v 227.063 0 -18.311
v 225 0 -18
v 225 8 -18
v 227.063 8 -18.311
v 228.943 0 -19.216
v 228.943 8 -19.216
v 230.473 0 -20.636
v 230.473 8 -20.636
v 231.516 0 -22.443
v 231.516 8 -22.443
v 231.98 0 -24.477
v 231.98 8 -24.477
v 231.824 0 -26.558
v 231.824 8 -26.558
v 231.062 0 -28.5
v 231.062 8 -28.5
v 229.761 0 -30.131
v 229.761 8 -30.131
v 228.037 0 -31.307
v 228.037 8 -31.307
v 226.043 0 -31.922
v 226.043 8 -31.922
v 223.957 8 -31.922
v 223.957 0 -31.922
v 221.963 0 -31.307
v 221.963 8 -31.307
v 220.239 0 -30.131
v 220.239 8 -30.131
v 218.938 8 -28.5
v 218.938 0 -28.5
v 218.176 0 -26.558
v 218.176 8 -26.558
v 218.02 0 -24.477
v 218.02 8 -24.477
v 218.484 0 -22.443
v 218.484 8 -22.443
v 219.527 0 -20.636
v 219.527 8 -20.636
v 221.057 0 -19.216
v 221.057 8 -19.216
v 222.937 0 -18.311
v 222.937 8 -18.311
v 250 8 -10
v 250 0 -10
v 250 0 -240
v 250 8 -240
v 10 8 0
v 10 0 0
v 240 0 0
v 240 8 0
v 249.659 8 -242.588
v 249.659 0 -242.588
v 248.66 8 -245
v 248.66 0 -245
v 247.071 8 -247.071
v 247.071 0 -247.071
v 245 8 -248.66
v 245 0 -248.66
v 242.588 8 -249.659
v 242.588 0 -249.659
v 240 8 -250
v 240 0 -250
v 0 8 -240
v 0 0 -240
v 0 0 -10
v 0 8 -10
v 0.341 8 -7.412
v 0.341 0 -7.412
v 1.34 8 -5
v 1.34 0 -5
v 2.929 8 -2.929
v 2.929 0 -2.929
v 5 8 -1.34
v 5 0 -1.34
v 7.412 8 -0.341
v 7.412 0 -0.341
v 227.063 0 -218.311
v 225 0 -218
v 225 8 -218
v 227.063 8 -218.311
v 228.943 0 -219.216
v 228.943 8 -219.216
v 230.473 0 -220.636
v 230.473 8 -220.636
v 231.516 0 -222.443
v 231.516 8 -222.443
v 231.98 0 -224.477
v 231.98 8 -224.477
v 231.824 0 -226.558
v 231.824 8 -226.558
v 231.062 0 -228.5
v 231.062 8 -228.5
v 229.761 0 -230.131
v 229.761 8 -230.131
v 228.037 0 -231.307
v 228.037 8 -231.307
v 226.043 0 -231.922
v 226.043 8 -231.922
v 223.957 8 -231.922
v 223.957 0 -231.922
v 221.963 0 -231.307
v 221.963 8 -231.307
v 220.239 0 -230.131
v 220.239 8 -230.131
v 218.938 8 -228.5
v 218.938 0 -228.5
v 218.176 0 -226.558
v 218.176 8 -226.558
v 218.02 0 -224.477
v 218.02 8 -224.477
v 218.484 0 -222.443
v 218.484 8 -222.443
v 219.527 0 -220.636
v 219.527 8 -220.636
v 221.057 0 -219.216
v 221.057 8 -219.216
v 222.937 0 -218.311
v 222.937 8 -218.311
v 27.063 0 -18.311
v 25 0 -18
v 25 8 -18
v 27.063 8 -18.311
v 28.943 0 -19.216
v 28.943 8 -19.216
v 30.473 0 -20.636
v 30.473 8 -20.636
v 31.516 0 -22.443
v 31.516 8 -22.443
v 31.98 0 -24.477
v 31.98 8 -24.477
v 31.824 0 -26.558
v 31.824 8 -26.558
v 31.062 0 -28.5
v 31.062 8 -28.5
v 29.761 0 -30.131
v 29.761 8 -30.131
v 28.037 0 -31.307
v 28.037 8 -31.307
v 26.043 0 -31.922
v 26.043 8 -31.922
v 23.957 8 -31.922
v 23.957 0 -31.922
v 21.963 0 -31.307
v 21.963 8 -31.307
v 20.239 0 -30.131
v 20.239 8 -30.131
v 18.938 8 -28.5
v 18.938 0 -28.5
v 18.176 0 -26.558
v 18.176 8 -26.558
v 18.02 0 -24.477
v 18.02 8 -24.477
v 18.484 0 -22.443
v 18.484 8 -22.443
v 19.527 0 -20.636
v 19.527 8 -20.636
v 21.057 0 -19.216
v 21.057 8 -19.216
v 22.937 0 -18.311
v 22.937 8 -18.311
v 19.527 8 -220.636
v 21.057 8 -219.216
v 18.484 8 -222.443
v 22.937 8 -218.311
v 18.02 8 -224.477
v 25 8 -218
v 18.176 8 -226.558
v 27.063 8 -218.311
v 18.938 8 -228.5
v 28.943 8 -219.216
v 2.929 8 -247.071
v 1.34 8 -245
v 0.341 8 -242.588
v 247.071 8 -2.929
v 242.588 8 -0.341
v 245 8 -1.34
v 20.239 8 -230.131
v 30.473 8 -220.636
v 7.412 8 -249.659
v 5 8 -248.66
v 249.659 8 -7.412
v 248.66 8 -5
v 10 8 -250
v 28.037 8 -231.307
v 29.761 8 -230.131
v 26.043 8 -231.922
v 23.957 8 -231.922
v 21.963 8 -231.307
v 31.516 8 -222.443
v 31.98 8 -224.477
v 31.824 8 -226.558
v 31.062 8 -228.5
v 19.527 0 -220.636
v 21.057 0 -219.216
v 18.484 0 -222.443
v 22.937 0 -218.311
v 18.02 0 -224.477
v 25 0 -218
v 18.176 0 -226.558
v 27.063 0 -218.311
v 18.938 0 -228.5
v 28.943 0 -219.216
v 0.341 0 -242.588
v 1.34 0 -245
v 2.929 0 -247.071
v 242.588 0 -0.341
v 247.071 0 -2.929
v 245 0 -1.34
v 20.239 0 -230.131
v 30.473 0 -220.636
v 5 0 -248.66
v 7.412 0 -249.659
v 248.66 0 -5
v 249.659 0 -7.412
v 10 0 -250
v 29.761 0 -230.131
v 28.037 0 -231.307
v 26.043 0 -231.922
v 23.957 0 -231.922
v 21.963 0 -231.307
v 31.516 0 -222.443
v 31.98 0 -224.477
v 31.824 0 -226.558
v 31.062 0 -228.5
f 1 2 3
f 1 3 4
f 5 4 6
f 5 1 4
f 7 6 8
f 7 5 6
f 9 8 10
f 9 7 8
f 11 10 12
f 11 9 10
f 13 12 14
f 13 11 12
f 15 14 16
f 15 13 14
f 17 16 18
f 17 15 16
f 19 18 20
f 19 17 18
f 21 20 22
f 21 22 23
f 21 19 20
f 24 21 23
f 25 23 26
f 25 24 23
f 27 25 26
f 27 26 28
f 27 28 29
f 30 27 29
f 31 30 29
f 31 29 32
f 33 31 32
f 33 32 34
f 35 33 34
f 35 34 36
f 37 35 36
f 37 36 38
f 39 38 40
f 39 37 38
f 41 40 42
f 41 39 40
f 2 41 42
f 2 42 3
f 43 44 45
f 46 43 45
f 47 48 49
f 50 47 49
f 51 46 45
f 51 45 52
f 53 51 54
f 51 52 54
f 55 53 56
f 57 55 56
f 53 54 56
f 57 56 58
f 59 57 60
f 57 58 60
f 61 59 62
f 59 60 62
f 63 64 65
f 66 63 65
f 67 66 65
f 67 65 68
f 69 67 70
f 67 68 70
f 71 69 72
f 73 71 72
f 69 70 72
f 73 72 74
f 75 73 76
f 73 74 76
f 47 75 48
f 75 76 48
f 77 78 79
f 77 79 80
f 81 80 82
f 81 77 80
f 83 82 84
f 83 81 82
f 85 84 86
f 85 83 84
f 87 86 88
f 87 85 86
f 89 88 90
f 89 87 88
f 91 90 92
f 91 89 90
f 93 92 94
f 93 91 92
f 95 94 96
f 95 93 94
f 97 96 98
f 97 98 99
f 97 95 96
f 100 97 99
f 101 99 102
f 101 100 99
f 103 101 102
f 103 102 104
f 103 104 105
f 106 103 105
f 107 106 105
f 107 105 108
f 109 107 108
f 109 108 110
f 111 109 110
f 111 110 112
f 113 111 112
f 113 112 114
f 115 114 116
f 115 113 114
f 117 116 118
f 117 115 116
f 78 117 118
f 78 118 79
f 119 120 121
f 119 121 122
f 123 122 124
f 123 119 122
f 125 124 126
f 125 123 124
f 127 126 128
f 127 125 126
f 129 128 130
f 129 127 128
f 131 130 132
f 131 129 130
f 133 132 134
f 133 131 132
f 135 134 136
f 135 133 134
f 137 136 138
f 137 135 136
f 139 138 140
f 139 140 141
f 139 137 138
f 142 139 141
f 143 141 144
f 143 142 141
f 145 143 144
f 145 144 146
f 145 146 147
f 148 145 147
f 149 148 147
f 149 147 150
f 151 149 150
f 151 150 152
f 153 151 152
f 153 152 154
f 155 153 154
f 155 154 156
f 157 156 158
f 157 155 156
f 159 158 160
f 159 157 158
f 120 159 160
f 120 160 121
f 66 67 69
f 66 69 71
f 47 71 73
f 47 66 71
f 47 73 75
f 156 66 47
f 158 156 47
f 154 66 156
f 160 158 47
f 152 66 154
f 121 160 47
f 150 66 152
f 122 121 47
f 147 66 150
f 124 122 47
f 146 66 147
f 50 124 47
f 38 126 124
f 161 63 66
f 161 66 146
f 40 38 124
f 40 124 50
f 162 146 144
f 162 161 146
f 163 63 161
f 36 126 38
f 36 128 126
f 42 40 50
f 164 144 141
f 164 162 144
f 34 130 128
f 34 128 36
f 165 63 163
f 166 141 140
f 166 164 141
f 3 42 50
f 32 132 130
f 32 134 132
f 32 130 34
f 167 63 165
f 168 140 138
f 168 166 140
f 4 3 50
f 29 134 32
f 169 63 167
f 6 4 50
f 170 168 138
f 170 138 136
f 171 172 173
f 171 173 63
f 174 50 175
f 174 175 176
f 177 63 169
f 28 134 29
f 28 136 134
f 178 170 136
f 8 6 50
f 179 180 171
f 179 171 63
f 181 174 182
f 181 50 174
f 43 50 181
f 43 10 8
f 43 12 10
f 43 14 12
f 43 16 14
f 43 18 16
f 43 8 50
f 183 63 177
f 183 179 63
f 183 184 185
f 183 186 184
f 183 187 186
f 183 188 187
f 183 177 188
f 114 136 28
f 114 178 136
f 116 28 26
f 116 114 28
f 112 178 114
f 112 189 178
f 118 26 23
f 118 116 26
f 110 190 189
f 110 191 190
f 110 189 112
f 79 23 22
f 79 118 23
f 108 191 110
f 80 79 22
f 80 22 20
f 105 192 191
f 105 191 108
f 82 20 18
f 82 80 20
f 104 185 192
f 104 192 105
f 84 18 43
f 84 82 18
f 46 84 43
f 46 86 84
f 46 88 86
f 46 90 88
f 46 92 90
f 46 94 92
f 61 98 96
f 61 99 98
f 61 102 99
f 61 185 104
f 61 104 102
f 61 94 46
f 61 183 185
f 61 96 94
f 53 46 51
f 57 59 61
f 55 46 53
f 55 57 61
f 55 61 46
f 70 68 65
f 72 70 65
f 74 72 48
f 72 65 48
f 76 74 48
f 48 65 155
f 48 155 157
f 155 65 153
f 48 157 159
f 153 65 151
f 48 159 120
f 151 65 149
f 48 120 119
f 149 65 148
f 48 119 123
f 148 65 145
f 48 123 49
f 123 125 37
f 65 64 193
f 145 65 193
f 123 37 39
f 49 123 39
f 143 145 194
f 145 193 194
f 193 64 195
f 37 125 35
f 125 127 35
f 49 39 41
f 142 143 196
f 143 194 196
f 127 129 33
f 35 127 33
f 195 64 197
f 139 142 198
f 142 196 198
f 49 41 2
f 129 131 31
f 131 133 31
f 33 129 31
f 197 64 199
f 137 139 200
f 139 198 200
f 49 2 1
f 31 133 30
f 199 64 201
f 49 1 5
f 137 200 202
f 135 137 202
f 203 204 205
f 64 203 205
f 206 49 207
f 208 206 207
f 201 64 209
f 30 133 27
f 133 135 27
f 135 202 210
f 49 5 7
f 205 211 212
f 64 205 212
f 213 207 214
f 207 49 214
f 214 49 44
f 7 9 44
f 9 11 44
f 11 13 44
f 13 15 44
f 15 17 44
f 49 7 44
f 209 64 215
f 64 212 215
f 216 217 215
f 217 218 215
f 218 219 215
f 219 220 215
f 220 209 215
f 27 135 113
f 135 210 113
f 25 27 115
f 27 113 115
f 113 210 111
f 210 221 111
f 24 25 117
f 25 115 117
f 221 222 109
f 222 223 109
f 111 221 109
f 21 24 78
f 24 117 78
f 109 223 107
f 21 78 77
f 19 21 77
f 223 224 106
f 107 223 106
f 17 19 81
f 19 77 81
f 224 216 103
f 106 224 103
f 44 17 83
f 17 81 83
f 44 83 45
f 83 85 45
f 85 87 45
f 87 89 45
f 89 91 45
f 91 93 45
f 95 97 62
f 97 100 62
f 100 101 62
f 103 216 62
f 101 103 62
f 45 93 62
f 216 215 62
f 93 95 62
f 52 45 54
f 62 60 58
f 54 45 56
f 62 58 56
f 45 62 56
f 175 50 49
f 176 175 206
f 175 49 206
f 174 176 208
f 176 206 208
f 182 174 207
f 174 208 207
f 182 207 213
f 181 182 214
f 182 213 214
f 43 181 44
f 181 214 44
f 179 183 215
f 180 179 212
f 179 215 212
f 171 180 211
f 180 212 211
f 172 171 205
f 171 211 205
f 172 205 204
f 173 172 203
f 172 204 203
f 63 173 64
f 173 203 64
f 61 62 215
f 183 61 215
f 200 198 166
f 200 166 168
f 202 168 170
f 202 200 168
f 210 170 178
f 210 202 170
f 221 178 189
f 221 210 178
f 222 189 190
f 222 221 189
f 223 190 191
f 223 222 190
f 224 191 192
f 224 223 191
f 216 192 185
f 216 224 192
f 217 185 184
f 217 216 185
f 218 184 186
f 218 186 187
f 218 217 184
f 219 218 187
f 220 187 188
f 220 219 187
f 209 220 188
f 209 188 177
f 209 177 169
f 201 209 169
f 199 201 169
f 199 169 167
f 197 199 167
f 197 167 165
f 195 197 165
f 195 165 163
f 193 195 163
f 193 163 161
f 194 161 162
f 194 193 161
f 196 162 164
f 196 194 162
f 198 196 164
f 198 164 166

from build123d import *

# Parameters (mm, degrees)
ESQUISSE1_R        = 7
BOSS_EXTRU_1_DEPTH = 8


with BuildPart() as part:
    # Esquisse1 → Boss.-Extru.1 (new body)
    with BuildSketch(Plane(origin=(0, 0, 0), x_dir=(1, 0, 0), z_dir=(0, 1, 0))):
        with BuildLine():
            Line((10, 0), (240, 0))
            ThreePointArc((240, 0), (247.071067812, 2.928932188), (250, 10))
            Line((250, 10), (250, 240))
            ThreePointArc((250, 240), (247.071067812, 247.071067812), (240, 250))
            Line((240, 250), (10, 250))
            ThreePointArc((10, 250), (2.928932188, 247.071067812), (0, 240))
            Line((0, 240), (0, 10))
            ThreePointArc((0, 10), (2.928932188, 2.928932188), (10, 0))
        make_face()
        with Locations(Location((25, 225, 0), (0, 0, 270))):  # turned: the seam where the file's is
            Circle(ESQUISSE1_R, mode=Mode.SUBTRACT)
        with Locations(Location((225, 225, 0), (0, 0, 270))):  # turned: the seam where the file's is
            Circle(ESQUISSE1_R, mode=Mode.SUBTRACT)
        with Locations(Location((225, 25, 0), (0, 0, 270))):  # turned: the seam where the file's is
            Circle(ESQUISSE1_R, mode=Mode.SUBTRACT)
        with Locations(Location((25, 25, 0), (0, 0, 270))):  # turned: the seam where the file's is
            Circle(ESQUISSE1_R, mode=Mode.SUBTRACT)
    extrude(amount=BOSS_EXTRU_1_DEPTH)


solid = part.part
